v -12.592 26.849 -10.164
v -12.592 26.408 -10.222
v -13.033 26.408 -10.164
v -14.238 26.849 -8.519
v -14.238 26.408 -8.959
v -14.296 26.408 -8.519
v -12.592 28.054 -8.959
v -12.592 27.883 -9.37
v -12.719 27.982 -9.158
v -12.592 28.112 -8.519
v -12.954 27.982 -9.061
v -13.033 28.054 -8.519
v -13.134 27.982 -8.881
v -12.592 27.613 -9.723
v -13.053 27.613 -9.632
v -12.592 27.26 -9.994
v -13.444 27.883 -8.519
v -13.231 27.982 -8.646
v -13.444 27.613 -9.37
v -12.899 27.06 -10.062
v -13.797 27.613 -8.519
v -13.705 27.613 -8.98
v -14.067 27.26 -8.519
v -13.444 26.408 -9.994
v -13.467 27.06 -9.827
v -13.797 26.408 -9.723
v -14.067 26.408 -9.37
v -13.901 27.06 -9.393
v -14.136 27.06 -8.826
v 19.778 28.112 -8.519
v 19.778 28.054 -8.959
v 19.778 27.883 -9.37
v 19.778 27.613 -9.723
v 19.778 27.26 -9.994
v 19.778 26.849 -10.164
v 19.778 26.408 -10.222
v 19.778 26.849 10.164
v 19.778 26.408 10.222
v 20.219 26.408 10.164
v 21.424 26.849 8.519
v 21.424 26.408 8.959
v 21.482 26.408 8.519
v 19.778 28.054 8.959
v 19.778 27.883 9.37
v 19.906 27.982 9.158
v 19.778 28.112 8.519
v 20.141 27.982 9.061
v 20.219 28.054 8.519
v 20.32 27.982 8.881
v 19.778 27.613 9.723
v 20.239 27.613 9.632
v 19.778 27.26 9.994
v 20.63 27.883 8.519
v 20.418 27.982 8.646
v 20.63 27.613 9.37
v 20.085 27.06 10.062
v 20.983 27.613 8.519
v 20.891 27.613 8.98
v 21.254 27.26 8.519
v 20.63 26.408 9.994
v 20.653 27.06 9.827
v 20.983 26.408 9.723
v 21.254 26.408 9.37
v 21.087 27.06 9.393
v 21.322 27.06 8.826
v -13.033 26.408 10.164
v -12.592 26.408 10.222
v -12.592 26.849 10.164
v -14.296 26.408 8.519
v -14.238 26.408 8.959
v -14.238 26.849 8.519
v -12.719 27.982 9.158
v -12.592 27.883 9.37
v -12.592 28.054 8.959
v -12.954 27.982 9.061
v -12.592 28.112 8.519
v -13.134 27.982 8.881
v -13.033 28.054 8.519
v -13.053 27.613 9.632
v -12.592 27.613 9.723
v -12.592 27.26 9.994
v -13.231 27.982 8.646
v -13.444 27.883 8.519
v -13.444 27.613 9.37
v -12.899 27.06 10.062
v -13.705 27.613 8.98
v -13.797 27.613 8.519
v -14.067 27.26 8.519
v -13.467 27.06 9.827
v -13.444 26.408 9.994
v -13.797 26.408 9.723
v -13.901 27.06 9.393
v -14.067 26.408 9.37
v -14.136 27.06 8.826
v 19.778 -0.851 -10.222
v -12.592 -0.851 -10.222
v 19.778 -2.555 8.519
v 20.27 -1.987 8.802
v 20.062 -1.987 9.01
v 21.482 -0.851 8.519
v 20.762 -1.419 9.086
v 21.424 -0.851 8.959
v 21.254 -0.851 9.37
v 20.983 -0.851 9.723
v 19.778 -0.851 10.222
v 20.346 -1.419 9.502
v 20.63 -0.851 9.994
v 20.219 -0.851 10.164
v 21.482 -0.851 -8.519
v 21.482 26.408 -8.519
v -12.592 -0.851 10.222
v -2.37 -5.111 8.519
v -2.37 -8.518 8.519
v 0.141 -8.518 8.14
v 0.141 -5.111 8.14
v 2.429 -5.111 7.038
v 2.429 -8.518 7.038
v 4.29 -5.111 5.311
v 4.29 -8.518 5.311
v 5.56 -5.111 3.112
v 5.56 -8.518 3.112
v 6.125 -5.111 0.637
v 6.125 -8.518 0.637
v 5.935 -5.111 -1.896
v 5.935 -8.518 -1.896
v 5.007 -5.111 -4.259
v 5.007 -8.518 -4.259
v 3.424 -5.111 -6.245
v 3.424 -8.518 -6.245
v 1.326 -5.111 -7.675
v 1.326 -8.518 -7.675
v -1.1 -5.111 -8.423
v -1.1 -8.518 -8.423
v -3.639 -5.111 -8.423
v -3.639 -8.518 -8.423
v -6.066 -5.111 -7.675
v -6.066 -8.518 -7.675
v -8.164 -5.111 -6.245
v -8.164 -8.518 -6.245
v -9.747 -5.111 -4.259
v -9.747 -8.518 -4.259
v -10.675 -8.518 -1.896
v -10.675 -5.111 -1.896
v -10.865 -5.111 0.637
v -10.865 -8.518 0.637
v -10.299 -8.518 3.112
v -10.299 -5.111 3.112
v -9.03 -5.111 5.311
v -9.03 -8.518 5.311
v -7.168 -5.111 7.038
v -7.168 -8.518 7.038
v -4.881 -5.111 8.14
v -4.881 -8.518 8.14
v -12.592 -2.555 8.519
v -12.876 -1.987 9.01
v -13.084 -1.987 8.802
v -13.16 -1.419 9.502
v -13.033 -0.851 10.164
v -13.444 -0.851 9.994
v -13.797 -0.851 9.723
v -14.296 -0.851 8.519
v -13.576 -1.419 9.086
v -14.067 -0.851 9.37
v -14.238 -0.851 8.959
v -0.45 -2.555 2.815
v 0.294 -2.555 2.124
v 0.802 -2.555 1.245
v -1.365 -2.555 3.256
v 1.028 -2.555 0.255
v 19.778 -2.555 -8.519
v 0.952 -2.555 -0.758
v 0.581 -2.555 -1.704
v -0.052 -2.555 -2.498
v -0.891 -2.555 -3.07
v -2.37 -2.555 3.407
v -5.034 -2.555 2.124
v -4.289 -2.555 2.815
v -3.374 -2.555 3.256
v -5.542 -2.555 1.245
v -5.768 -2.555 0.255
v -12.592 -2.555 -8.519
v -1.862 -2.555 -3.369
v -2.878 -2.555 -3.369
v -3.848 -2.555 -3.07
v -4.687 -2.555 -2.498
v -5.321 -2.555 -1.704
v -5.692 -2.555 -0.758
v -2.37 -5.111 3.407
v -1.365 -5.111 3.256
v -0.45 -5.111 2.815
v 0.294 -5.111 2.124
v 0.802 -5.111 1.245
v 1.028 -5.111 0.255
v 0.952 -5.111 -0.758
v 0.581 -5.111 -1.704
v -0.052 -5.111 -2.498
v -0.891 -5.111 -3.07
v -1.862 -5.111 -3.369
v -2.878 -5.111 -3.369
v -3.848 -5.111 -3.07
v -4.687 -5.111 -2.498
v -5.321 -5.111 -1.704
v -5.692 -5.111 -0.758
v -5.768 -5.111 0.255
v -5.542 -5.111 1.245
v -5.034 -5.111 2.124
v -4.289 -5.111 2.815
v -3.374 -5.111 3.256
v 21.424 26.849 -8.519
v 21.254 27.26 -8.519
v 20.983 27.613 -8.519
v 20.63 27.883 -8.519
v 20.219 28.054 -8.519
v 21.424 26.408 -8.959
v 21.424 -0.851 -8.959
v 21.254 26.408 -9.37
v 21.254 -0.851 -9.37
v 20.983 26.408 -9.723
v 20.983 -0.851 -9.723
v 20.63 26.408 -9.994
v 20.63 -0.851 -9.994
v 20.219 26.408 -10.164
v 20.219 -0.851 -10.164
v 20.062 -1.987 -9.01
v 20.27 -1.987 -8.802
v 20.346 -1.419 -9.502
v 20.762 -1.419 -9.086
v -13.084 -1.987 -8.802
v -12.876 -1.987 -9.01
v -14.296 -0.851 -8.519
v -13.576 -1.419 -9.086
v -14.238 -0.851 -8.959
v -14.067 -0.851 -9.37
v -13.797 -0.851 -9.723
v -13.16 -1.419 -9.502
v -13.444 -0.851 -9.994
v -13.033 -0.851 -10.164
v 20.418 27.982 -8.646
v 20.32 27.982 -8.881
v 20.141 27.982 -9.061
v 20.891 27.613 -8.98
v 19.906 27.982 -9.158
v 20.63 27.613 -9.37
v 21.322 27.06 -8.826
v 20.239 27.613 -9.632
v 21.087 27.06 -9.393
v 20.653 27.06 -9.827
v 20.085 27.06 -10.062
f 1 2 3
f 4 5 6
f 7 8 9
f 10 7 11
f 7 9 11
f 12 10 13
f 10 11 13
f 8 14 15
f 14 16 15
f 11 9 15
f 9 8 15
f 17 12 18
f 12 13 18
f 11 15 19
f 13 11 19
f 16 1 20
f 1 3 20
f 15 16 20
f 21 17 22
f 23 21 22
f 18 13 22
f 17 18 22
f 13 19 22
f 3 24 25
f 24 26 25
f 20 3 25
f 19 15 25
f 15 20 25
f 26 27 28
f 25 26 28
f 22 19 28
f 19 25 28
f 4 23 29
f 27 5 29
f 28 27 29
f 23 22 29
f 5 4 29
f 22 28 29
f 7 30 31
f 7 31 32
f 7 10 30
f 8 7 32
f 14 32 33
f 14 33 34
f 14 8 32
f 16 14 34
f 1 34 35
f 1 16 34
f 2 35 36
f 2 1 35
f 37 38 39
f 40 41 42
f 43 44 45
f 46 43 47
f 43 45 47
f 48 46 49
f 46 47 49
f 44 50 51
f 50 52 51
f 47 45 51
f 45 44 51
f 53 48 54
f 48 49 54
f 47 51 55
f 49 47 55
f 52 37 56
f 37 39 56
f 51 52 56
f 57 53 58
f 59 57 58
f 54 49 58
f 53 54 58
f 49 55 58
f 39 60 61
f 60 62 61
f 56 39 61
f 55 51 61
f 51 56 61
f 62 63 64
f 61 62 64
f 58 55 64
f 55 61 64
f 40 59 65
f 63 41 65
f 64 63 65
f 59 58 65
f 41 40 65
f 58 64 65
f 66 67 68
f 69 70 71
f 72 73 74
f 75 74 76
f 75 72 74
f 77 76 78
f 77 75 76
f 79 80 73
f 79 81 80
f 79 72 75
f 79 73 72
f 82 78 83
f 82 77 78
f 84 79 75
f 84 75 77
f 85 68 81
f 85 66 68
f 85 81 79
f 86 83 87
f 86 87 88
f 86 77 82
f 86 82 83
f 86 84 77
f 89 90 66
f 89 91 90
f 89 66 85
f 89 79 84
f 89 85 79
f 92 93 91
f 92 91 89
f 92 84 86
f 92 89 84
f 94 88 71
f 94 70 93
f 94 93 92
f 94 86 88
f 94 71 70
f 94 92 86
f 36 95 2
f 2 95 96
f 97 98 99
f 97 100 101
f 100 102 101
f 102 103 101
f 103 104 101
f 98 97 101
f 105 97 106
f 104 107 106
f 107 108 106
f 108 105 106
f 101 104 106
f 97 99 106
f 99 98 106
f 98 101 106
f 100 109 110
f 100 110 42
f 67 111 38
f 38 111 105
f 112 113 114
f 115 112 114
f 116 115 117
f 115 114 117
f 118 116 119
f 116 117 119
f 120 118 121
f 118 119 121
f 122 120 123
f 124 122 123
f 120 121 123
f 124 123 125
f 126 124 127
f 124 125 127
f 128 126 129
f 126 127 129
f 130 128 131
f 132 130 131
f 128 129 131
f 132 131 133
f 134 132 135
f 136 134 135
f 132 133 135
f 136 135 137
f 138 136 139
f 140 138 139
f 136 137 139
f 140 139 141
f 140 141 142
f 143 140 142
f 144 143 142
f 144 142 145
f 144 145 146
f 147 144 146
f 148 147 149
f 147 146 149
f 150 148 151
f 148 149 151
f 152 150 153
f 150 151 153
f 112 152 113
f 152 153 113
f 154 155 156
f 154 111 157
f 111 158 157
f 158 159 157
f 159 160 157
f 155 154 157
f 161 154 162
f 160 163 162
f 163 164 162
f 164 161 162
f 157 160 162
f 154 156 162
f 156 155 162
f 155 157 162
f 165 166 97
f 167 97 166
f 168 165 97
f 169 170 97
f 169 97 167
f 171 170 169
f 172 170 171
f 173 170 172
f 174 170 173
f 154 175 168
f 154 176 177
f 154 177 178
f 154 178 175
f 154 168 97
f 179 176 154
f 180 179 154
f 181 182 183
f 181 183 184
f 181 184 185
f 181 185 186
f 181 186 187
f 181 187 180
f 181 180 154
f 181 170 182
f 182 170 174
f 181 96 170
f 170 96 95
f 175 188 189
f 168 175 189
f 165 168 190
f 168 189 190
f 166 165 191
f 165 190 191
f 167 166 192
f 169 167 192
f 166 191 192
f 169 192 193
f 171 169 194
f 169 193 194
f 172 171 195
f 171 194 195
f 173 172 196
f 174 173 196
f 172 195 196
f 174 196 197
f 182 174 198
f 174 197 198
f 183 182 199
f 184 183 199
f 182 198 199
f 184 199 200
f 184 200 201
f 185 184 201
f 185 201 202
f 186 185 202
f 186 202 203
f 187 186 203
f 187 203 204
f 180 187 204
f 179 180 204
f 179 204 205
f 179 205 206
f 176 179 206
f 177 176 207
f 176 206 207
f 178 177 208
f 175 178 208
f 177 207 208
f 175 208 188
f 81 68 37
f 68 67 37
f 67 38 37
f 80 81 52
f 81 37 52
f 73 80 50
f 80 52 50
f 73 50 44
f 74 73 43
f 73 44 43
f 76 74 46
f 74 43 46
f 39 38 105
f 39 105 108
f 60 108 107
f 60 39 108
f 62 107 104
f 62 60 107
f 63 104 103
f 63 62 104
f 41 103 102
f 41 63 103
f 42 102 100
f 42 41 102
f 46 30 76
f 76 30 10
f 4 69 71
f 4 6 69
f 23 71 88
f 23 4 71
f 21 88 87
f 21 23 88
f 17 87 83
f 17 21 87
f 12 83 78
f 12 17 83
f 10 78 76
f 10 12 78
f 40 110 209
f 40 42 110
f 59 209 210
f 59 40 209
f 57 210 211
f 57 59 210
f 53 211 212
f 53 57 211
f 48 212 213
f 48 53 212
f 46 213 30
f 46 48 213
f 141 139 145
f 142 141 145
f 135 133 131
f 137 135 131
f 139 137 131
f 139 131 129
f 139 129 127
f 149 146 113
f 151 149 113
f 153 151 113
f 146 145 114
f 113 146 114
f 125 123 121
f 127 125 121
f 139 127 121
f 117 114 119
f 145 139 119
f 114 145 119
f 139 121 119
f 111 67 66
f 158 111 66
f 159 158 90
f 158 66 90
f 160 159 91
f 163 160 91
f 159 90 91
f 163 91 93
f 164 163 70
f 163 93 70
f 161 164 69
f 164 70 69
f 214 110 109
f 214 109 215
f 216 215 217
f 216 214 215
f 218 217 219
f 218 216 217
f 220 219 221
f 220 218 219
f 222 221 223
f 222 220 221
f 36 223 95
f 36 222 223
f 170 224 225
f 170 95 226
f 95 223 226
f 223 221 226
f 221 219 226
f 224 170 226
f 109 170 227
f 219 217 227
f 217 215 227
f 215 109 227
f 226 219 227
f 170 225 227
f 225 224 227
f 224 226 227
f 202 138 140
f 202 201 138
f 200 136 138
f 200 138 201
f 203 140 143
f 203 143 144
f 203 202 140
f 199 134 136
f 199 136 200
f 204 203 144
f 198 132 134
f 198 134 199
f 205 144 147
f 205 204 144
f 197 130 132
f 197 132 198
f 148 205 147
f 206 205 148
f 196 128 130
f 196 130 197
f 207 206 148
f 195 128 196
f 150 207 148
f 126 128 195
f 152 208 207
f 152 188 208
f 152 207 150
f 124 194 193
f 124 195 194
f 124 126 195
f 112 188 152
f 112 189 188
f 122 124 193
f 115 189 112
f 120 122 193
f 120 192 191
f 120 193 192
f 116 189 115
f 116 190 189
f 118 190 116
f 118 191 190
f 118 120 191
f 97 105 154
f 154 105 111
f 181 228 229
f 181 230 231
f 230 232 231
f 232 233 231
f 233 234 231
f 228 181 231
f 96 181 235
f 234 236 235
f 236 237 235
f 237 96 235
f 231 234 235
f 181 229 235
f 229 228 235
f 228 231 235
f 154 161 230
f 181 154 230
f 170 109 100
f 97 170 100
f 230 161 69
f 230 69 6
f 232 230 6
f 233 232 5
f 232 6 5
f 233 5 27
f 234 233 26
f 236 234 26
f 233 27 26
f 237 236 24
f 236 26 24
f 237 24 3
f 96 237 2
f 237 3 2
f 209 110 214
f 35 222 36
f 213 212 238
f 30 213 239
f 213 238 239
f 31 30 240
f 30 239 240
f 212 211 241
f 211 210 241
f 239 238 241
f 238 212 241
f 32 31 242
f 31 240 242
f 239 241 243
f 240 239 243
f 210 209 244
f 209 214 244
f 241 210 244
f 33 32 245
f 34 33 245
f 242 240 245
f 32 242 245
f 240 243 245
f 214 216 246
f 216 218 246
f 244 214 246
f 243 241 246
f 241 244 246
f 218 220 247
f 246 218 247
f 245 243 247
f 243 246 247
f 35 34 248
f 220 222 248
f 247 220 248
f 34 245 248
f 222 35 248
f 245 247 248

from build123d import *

# Parameters (mm, degrees)
SKETCH_1_R      = 5
EXTRUDE_1_DEPTH = 2
SKETCH_2_R      = 2
EXTRUDE_2_DEPTH = 1.5
EXTRUDE_3_DEPTH = 18
FILLET_1_R      = 1
CHAMFER_1_SIZE  = 1
SCALE_1_SCALE   = 1.703703703


with BuildPart() as part:
    # 草图1 → 凸台-拉伸1 (new body)
    with BuildSketch(Plane(origin=(0, 0, 0), x_dir=(1, 0, 0), z_dir=(0, 1, 0))):
        with Locations(Location((0, 0, 0), (0, 0, 270))):
            Circle(SKETCH_1_R)
    extrude(amount=EXTRUDE_1_DEPTH)

    # 草图2 → 凸台-拉伸2 (add)
    with BuildSketch(Plane(origin=(0, 2, 0), x_dir=(1, 0, 0), z_dir=(0, 1, 0))):
        with Locations(Location((0, 0, 0), (0, 0, 270))):
            Circle(SKETCH_2_R)
    extrude(amount=EXTRUDE_2_DEPTH)

    # 草图3 → 凸台-拉伸3 (add)
    with BuildSketch(Plane(origin=(0, 3.5, 0), x_dir=(1, 0, 0), z_dir=(0, 1, 0))):
        Polygon((0, -6), (-7, -6), (-7, 6), (0, 6), (14, 6), (14, -6), align=None)
    extrude(amount=EXTRUDE_3_DEPTH)

    # 圆角1
    fillet_1_edges = [part.edges().sort_by_distance(p)[0] for p in [
        (14, 12.5, 6),
        (14, 12.5, -6),
        (-7, 12.5, -6),
        (-7, 12.5, 6),
        (3.5, 21.5, 6),
        (14, 21.5, 0),
        (3.5, 21.5, -6),
        (-7, 21.5, 0),
    ]]
    fillet(fillet_1_edges, radius=FILLET_1_R)

    # 倒角1
    chamfer_1_edges = [part.edges().sort_by_distance(p)[0] for p in [
        (-7, 3.5, 0),
        (3.5, 3.5, -6),
        (14, 3.5, 0),
        (3.5, 3.5, 6),
        (-6.707106781, 3.5, -5.707106781),
        (-6.707106781, 3.5, 5.707106781),
        (13.707106781, 3.5, -5.707106781),
        (13.707106781, 3.5, 5.707106781),
    ]]
    chamfer(chamfer_1_edges, length=CHAMFER_1_SIZE)


with BuildPart() as part_1:
    # 缩放比例1: scaled about (3.367633963, 12.104632395, 0)
    add(part.part.scale(SCALE_1_SCALE).moved(Location((-2.36981649, -8.518074639, 0))))


solid = part_1.part
